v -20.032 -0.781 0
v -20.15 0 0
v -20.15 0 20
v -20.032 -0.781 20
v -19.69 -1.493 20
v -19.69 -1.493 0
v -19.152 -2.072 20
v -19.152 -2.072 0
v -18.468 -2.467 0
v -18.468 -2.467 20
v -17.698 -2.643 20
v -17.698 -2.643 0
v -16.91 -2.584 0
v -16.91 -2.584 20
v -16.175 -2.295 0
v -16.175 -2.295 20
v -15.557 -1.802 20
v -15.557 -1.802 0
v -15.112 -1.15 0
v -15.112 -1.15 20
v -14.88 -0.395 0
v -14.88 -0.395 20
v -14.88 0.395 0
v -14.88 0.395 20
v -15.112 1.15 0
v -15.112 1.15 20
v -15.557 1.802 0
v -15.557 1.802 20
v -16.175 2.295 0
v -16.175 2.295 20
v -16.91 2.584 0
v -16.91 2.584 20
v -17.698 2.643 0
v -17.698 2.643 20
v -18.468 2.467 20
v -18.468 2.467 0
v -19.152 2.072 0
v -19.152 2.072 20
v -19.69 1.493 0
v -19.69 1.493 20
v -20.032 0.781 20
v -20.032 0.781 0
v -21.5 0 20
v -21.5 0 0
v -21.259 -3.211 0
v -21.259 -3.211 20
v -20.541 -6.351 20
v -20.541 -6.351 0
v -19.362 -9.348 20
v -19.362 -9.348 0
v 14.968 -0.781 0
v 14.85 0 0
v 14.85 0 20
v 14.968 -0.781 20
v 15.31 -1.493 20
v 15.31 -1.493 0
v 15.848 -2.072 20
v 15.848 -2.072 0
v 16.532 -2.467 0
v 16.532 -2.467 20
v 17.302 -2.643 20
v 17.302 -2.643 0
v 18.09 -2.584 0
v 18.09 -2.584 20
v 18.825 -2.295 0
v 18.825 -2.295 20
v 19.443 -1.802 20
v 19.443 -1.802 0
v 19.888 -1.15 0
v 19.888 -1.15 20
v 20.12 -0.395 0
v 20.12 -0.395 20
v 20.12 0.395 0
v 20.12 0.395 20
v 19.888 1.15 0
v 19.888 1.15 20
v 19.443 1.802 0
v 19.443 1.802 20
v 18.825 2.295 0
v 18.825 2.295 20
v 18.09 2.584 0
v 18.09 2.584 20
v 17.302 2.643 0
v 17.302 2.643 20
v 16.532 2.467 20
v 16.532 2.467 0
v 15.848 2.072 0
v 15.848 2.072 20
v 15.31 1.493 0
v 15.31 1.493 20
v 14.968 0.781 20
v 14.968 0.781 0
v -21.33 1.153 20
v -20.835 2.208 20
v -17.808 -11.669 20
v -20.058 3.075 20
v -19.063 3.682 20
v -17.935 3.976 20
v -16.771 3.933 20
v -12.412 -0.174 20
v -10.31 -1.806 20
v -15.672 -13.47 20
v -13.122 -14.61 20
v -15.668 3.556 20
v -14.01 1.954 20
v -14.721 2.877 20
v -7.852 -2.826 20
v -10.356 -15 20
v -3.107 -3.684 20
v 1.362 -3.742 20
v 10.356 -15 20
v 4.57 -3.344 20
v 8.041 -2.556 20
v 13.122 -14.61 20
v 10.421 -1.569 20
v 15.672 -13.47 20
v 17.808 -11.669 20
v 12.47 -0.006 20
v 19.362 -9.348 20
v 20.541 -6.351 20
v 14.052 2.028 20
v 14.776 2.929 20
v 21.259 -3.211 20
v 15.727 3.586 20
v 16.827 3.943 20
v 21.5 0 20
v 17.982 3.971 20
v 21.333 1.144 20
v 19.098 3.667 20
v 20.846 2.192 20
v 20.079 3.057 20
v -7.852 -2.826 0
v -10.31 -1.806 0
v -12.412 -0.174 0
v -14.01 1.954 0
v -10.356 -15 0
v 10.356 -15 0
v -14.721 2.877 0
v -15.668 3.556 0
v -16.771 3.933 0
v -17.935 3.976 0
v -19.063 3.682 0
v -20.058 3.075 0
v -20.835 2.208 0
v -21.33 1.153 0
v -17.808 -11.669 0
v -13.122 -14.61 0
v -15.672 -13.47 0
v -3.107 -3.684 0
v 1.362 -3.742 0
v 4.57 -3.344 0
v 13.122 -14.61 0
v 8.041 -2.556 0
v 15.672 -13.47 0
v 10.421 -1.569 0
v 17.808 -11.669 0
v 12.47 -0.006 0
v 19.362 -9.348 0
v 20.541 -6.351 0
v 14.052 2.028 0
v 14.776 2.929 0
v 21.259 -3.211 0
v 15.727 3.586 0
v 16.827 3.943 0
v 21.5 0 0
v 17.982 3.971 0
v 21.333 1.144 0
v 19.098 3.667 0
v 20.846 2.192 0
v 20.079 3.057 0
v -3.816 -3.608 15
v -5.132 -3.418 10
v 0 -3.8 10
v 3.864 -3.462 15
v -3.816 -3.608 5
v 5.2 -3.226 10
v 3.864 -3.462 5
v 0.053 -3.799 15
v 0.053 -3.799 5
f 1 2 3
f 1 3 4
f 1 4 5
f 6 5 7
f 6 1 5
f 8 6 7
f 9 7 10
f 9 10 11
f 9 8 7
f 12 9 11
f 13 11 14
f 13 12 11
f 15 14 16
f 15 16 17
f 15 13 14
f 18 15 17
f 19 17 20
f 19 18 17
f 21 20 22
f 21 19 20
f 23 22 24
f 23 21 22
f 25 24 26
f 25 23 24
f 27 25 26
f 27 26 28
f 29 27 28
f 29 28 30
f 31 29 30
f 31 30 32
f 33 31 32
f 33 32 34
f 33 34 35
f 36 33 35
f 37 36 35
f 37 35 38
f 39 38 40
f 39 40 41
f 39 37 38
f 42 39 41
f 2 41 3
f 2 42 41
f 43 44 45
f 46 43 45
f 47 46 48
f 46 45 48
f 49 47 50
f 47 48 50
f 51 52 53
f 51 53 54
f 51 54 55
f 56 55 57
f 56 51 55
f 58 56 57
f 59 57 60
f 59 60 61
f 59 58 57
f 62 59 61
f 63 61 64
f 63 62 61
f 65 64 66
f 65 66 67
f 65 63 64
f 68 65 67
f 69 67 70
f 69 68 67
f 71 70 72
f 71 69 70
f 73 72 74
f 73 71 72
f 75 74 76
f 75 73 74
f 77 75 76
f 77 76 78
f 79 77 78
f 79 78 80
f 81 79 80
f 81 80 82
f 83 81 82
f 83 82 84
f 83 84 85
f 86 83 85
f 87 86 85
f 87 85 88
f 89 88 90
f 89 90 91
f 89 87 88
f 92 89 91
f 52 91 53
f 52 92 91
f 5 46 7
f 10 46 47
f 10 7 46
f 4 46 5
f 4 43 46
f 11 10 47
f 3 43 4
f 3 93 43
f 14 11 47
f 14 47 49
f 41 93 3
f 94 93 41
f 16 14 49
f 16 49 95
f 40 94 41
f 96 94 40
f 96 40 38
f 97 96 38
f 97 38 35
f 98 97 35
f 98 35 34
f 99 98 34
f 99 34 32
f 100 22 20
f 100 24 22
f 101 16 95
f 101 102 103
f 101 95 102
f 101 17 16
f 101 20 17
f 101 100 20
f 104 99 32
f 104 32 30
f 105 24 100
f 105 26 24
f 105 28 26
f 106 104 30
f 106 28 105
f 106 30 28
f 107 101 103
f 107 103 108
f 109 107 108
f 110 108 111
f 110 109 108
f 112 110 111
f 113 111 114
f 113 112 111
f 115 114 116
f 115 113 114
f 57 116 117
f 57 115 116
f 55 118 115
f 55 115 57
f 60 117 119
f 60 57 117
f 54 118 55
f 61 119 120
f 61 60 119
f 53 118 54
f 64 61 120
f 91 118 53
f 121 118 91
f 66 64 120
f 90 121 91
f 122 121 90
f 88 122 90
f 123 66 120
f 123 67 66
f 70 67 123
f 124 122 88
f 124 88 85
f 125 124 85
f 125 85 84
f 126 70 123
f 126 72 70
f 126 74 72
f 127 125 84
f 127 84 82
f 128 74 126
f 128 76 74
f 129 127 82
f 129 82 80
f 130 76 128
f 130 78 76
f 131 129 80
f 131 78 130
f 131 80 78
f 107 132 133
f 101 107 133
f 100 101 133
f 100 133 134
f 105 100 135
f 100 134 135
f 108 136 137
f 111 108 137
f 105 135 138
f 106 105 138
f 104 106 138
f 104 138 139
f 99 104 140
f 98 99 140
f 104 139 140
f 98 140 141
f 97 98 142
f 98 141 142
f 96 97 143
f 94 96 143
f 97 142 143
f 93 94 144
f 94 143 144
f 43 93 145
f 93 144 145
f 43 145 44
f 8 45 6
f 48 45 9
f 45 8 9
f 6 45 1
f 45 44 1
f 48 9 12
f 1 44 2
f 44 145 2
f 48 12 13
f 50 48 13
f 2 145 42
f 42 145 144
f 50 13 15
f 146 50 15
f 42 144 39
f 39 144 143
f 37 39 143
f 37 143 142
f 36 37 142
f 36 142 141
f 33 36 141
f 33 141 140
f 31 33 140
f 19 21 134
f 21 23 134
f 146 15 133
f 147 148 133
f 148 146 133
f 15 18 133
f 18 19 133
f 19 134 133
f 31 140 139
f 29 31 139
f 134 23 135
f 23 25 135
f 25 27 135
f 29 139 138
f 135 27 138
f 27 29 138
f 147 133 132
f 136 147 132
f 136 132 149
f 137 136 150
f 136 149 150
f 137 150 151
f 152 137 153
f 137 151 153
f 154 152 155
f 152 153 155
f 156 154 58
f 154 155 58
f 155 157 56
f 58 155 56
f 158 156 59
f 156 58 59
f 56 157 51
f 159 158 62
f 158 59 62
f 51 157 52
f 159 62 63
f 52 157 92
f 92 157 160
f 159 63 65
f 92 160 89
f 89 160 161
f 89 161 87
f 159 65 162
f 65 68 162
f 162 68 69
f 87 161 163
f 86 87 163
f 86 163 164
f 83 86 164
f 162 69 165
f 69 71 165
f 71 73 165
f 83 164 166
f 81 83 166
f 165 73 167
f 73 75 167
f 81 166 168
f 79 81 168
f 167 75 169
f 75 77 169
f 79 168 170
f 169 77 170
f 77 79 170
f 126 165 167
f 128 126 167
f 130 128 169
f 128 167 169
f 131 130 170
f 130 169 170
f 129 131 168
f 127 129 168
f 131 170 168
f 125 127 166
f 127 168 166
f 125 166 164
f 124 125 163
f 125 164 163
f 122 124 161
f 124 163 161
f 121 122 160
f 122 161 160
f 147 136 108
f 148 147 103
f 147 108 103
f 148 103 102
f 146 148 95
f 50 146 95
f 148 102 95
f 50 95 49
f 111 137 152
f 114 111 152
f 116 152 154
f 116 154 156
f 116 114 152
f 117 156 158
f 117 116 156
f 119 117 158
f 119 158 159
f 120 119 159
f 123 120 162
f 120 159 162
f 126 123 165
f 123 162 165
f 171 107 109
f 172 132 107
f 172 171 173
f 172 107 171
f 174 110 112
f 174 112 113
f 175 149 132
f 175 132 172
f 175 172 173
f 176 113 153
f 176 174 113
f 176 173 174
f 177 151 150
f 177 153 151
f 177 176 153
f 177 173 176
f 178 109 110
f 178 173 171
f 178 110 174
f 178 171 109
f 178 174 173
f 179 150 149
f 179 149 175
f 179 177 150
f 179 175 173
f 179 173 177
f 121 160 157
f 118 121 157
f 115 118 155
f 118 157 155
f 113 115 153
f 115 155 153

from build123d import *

# Parameters (mm, degrees)
SCHIZZO1_R                   = 2.65
ESTRUSIONE_ESTRUSIONE1_DEPTH = 20
RACCORDO1_R                  = 10


with BuildPart() as part:
    # Schizzo1 → Estrusione-Estrusione1 (new body)
    with BuildSketch(Plane.XY):
        with BuildLine():
            Line((-15.402921801, -15), (15.402921801, -15))
            ThreePointArc((15.402921801, -15), (19.917490037, -8.095899619), (21.5, 0))
            ThreePointArc((21.5, 0), (18.550983955, 3.85946016), (14.052283637, 2.028115352))
            ThreePointArc((14.052283637, 2.028115352), (11.496390023, -0.853653439), (8.040859025, -2.555560913))
            add(Edge.make_bspline(
                [(-7.852499182, -2.82564864), (-5.063118639, -3.566960484), (0.144262576, -4.132980744), (5.056977543, -3.361609436), (8.040859025, -2.555560913)],
                knots=[0.170124619, 0.170124619, 0.170124619, 0.170124619, 0.505124636, 0.849602566, 0.849602566, 0.849602566, 0.849602566], degree=3))
            ThreePointArc((-7.852499182, -2.82564864), (-11.415971798, -1.060452164), (-14.009724205, 1.953963888))
            ThreePointArc((-14.009724205, 1.953963888), (-18.509677379, 3.870471753), (-21.5, 0))
            ThreePointArc((-21.5, 0), (-19.917490037, -8.095899619), (-15.402921801, -15))
        make_face()
        with Locations(Location((-17.5, 0, 0), (0, 0, 180))):
            Circle(SCHIZZO1_R, mode=Mode.SUBTRACT)
        with Locations(Location((17.5, 0, 0), (0, 0, 180))):
            Circle(SCHIZZO1_R, mode=Mode.SUBTRACT)
    extrude(amount=ESTRUSIONE_ESTRUSIONE1_DEPTH)

    # Raccordo1
    raccordo1_edges = [part.edges().sort_by_distance(p)[0] for p in [
        (15.402921801, -15, 10),
        (-15.402921801, -15, 10),
    ]]
    fillet(raccordo1_edges, radius=RACCORDO1_R)


solid = part.part
